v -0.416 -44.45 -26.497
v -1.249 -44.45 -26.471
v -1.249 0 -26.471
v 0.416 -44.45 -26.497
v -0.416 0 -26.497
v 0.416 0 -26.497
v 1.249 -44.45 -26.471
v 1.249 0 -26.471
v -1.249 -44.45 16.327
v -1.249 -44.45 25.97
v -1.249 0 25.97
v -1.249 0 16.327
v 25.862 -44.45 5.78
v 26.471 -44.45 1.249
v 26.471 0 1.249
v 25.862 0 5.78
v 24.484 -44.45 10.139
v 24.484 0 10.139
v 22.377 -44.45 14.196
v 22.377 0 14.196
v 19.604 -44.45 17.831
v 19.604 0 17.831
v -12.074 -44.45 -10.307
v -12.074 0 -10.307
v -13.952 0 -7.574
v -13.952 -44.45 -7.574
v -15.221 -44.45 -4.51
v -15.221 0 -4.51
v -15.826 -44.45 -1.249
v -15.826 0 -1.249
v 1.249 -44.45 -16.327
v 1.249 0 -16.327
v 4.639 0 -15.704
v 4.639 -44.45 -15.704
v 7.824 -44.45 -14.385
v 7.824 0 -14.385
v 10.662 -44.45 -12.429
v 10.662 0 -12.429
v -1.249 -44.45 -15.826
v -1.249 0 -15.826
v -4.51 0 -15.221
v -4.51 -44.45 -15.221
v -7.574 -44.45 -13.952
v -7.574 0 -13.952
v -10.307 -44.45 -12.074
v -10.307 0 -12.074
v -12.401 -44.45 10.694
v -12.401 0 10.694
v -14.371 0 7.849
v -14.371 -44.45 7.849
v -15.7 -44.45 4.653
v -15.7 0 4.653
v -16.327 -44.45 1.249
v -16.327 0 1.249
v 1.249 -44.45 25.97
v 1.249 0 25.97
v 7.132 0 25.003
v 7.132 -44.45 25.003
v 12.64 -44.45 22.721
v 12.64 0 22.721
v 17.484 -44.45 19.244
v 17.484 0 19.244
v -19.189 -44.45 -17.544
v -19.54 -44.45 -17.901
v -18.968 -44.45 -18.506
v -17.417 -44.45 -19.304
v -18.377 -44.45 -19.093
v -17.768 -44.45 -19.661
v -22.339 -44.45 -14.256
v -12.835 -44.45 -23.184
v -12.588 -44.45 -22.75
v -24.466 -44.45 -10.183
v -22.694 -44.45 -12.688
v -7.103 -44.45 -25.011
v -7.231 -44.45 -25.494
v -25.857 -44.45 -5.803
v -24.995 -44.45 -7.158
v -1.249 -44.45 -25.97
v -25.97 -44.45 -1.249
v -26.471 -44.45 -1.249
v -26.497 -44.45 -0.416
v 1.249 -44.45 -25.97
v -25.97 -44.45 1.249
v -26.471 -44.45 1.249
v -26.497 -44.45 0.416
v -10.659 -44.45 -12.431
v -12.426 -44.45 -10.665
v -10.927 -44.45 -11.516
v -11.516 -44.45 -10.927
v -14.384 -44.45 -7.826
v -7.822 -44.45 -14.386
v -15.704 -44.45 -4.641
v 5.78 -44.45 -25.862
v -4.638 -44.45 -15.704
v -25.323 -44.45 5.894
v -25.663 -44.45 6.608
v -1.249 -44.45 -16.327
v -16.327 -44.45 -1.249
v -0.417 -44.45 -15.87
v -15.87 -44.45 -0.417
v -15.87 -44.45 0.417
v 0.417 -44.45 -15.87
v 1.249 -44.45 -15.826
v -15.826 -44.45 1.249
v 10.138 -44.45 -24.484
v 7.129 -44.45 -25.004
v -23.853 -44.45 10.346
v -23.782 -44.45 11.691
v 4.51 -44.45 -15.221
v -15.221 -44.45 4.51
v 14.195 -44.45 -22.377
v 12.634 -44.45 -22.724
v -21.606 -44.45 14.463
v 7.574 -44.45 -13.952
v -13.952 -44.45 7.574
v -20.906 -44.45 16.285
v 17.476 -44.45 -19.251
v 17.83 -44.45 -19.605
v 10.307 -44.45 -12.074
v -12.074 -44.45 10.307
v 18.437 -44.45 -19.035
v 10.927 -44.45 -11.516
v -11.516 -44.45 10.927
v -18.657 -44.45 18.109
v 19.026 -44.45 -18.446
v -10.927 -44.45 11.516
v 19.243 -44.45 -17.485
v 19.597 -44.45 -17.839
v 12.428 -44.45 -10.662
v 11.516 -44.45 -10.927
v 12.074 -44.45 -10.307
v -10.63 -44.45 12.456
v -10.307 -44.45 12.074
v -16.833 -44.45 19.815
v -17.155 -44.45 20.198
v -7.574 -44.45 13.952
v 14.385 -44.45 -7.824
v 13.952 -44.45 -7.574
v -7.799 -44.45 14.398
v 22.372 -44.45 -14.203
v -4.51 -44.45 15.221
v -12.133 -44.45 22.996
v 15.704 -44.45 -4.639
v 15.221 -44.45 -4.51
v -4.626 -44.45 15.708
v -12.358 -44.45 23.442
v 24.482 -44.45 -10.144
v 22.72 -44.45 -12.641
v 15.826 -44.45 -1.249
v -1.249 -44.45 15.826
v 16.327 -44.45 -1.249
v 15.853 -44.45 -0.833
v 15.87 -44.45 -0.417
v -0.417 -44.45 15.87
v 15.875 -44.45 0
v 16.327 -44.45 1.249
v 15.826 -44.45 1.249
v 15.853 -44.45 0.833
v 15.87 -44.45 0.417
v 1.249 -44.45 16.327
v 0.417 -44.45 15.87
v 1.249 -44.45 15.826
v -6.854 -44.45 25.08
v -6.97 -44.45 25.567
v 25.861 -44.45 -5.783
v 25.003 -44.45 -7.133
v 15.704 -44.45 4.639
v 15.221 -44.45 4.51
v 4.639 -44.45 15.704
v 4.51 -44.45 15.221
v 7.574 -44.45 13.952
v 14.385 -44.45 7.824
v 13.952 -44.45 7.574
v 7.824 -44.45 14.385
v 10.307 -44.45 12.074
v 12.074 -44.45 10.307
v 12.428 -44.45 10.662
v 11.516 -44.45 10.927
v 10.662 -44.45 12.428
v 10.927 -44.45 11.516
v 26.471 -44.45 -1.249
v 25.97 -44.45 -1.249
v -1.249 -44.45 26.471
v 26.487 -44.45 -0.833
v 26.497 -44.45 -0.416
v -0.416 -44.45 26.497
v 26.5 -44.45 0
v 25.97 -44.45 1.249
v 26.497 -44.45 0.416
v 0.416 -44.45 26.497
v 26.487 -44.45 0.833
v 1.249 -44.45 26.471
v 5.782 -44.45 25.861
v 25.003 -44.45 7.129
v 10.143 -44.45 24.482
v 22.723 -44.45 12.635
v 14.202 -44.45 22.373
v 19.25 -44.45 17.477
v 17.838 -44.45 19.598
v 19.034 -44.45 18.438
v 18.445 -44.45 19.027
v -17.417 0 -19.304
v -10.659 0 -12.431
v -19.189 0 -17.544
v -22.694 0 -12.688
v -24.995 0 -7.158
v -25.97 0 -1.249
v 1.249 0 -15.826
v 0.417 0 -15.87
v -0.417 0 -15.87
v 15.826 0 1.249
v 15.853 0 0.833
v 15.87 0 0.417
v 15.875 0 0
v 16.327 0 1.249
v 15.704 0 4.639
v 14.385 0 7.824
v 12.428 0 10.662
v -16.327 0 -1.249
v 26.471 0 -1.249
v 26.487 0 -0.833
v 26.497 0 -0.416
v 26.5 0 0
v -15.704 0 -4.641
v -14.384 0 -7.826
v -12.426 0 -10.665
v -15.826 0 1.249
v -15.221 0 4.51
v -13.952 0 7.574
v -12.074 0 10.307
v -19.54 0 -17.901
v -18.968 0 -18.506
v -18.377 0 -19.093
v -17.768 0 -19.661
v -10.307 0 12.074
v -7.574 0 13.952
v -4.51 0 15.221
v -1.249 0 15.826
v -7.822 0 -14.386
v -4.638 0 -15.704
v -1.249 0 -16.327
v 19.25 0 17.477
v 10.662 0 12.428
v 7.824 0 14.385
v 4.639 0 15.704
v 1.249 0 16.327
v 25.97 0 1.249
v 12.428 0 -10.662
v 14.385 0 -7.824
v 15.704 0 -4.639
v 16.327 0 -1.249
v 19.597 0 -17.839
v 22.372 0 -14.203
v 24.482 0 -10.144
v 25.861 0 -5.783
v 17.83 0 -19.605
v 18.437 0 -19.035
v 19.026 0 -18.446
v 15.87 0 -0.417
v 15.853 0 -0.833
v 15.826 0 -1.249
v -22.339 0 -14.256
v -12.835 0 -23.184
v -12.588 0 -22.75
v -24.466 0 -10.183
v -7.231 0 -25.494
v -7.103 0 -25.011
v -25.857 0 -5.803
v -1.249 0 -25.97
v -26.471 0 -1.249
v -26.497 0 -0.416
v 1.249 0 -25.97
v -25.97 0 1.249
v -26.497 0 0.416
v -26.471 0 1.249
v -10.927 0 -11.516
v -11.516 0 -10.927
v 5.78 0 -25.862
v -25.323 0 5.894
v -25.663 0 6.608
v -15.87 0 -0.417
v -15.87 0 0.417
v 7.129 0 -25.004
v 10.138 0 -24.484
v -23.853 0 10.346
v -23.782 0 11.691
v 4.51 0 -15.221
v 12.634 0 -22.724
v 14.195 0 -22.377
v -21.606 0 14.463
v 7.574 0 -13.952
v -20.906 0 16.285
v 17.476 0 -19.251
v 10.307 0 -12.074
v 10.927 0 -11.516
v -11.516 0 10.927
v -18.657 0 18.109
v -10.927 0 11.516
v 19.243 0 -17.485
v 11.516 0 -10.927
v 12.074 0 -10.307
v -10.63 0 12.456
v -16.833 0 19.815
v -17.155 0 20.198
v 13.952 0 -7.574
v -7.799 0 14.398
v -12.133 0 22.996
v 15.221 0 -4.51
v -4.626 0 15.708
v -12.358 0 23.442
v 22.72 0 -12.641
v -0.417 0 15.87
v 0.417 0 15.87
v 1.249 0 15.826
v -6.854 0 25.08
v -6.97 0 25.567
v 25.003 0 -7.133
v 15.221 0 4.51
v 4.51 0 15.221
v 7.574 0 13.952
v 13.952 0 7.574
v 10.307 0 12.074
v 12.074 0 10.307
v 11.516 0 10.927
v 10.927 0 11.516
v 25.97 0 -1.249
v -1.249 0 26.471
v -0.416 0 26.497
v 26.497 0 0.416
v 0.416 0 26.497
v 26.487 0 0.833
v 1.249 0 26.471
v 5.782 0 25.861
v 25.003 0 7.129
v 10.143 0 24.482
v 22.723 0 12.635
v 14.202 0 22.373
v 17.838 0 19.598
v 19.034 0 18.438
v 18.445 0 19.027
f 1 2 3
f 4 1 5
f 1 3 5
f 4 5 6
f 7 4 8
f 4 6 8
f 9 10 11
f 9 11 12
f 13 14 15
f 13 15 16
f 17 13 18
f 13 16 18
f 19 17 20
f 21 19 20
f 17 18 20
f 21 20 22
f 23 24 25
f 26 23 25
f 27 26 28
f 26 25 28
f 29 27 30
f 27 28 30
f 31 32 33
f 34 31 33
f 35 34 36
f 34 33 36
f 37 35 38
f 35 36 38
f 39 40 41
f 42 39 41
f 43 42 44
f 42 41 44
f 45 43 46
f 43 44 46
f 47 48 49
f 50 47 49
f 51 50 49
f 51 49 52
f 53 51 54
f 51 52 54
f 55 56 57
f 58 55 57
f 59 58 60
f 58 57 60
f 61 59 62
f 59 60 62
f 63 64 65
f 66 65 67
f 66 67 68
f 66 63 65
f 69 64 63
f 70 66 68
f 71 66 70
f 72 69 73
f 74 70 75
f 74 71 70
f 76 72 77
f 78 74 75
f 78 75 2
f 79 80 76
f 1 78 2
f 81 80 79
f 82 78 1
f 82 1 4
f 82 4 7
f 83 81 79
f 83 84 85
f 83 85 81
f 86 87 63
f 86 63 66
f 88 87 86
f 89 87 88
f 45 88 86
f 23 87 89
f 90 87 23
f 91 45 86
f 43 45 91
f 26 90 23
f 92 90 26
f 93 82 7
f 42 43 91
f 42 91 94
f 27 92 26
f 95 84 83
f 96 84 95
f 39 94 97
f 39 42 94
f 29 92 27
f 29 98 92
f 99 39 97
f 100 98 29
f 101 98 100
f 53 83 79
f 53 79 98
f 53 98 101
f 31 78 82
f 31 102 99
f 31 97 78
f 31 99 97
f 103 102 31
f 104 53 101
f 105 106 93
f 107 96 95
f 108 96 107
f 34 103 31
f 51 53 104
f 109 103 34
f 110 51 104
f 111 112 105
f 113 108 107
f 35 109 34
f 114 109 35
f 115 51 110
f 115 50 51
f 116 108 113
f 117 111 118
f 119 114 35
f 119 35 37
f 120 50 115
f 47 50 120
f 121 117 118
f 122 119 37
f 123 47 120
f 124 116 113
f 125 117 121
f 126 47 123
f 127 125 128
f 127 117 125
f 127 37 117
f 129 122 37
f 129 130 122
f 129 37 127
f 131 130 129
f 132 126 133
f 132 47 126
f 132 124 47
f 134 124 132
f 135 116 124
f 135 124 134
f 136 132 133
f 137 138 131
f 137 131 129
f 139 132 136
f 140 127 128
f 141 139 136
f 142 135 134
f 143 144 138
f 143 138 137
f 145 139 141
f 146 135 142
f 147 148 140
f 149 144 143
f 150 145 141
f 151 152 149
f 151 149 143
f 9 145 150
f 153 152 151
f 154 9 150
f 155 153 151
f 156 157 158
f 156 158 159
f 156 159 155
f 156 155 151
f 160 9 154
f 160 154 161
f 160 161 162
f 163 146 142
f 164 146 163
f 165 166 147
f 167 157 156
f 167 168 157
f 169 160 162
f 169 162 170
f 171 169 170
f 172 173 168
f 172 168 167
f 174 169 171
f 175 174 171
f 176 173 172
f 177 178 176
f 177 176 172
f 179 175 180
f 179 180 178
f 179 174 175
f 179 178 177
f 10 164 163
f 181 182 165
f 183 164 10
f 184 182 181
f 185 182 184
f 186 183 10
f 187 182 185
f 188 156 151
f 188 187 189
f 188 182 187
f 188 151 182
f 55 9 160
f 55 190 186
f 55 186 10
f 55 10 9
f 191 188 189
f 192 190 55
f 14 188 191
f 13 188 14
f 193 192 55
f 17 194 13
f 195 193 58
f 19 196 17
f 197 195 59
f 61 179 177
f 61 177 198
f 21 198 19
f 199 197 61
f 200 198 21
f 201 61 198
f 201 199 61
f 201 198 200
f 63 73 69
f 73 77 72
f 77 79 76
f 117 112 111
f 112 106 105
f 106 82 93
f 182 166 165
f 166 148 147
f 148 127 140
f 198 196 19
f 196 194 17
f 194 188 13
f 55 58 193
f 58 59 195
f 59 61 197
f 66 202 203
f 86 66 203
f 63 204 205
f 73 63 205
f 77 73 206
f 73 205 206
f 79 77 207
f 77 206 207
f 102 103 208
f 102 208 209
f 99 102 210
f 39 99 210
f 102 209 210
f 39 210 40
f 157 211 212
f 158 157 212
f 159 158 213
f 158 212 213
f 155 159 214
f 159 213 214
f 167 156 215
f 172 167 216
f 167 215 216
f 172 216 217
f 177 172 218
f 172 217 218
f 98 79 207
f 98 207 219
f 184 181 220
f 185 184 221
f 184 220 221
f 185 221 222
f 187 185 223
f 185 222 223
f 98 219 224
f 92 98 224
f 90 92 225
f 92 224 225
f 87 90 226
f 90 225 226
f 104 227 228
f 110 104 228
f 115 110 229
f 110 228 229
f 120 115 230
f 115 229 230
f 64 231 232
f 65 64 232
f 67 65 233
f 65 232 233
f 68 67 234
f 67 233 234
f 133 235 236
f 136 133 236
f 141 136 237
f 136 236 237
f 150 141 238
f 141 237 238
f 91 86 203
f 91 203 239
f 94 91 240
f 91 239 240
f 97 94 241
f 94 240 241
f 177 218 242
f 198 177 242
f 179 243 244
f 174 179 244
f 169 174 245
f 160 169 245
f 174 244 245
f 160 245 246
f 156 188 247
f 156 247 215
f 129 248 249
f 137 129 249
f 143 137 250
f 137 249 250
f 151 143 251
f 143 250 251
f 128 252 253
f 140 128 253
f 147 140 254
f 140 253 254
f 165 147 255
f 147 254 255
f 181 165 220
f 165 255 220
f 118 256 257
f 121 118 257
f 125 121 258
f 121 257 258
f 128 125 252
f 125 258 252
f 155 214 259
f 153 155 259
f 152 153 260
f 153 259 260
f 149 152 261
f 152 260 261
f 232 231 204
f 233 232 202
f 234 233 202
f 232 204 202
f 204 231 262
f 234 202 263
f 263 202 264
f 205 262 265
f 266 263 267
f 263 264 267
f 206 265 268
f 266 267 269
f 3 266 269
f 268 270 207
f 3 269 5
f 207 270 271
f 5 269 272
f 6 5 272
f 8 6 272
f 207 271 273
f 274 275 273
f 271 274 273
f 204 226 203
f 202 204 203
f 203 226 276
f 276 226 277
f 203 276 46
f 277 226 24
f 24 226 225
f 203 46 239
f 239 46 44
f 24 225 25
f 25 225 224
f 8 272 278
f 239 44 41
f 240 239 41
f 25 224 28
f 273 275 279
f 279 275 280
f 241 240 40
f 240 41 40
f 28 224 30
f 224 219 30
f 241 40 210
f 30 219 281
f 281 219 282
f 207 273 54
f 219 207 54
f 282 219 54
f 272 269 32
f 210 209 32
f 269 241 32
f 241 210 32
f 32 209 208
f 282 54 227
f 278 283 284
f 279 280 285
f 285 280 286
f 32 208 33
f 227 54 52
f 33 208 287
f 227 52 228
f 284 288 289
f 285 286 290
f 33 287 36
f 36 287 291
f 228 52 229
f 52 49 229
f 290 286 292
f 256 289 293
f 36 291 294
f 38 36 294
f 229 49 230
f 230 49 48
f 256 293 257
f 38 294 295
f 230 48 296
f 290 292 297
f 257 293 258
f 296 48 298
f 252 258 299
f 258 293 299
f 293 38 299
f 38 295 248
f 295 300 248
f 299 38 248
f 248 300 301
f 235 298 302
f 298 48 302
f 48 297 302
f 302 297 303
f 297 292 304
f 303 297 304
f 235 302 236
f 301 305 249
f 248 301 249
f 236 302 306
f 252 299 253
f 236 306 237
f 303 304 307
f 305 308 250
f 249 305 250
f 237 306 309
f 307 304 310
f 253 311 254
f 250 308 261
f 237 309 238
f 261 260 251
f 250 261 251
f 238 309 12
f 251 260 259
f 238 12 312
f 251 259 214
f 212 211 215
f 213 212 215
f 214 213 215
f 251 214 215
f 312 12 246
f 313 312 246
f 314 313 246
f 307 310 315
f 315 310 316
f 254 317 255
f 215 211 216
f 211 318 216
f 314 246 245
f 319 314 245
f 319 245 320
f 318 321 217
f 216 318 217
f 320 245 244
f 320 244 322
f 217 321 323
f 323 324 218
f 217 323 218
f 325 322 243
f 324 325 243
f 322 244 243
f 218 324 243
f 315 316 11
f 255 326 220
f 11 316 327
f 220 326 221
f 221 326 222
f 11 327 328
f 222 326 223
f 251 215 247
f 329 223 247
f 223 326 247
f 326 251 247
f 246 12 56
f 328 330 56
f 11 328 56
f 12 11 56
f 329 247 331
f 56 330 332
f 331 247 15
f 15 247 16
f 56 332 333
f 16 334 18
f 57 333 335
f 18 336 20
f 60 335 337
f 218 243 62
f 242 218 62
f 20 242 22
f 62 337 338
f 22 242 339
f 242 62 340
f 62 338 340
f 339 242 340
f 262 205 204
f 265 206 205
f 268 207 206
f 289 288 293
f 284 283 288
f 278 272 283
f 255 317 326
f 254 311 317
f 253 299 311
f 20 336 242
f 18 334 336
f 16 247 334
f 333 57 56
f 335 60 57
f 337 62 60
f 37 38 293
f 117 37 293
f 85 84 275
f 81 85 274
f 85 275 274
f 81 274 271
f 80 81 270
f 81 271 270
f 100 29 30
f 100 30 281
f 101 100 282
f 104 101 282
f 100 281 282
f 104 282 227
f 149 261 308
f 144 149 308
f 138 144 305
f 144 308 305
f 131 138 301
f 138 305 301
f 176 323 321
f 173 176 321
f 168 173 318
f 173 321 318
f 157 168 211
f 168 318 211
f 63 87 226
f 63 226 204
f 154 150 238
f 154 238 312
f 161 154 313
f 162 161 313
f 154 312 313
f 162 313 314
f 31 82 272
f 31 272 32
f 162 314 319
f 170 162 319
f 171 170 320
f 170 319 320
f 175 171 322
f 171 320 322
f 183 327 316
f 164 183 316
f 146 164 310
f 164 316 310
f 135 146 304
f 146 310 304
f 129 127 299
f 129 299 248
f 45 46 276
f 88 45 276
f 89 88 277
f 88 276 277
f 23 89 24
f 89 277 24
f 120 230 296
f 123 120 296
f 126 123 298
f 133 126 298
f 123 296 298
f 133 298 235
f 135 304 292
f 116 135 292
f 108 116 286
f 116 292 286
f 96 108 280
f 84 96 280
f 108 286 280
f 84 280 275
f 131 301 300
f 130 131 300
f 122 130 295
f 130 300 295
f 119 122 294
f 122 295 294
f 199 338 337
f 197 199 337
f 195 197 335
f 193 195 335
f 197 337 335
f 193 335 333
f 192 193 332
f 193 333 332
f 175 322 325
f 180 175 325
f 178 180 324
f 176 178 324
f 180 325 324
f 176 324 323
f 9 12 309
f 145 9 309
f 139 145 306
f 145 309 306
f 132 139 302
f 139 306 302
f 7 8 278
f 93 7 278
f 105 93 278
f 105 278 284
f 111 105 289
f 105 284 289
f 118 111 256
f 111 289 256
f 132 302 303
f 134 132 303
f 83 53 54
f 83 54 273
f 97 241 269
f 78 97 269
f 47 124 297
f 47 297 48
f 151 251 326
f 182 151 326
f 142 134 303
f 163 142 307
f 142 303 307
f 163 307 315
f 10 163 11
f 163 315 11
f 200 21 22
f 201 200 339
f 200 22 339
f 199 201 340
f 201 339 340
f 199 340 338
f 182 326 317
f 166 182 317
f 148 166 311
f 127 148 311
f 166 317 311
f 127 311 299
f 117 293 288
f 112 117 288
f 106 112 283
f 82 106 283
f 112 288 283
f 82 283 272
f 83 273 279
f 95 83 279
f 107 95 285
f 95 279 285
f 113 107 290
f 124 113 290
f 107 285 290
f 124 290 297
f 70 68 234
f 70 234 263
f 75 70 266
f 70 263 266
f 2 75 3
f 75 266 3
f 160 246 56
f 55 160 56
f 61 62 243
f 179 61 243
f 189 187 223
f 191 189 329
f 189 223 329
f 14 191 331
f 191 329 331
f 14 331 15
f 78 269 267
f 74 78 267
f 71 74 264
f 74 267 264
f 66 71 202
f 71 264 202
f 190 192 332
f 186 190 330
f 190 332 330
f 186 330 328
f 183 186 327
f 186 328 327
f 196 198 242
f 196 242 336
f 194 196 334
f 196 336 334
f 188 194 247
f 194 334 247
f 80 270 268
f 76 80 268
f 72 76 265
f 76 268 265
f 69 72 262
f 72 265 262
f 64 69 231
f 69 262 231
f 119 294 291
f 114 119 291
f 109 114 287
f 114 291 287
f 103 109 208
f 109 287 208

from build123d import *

# Parameters (mm, degrees)
F1_DEPTH = 44.45


with BuildPart() as f1:
    # F0 (on Front) → F1 (new body)
    with BuildSketch(Plane.XZ):
        with BuildLine():
            Line((-1.2490308724, 15.8257874016), (-1.2490308724, 16.3272945364))
            ThreePointArc((-1.2490308724, 16.3272945364), (-6.2468599625, 15.1366233226), (-10.6297427896, 12.455889901))
            Line((-10.6297427896, 12.455889901), (-10.3074871892, 12.0735799515))
            ThreePointArc((-10.3074871892, 12.0735799515), (-6.0751989773, 14.6665463687), (-1.2490308724, 15.8257874016))
        make_face()
        with BuildLine():
            Line((1.2490308724, 15.8257874016), (1.2490308724, 16.3272945364))
            ThreePointArc((1.2490308724, 16.3272945364), (0, 16.375), (-1.2490308724, 16.3272945364))
            Line((-1.2490308724, 16.3272945364), (-1.2490308724, 15.8257874016))
            ThreePointArc((-1.2490308724, 15.8257874016), (0, 15.875), (1.2490308724, 15.8257874016))
        make_face()
        with BuildLine():
            Line((-10.3074871892, 12.0735799515), (-10.6297427896, 12.455889901))
            ThreePointArc((-10.6297427896, 12.455889901), (-11.5487712868, 11.6088977411), (-12.4005243169, 10.6942798573))
            Line((-12.4005243169, 10.6942798573), (-12.0738596244, 10.3071595879))
            ThreePointArc((-12.0738596244, 10.3071595879), (-11.2254724409, 11.2251678597), (-10.3074871892, 12.0735799515))
        make_face()
        with BuildLine():
            Line((-12.0738596244, 10.3071595879), (-12.4005243169, 10.6942798573))
            ThreePointArc((-12.4005243169, 10.6942798573), (-15.120353042, 6.2861394262), (-16.3272945364, 1.2490308724))
            Line((-16.3272945364, 1.2490308724), (-15.8257874016, 1.2490308724))
            ThreePointArc((-15.8257874016, 1.2490308724), (-14.6666287878, 6.075), (-12.0738596244, 10.3071595879))
        make_face()
        with BuildLine():
            Line((-15.8257874016, 1.2490308724), (-16.3272945364, 1.2490308724))
            ThreePointArc((-16.3272945364, 1.2490308724), (-16.375, 0), (-16.3272945364, -1.2490308724))
            Line((-16.3272945364, -1.2490308724), (-15.8257874016, -1.2490308724))
            ThreePointArc((-15.8257874016, -1.2490308724), (-15.875, 0), (-15.8257874016, 1.2490308724))
        make_face()
        with BuildLine():
            ThreePointArc((-16.3272945364, -1.2490308724), (-15.1277540364, -6.2683078112), (-12.42570743, -10.6650091357))
            Line((-12.42570743, -10.6650091357), (-12.0738596244, -10.3071595879))
            ThreePointArc((-12.0738596244, -10.3071595879), (-14.6666287878, -6.075), (-15.8257874016, -1.2490308724))
            Line((-15.8257874016, -1.2490308724), (-16.3272945364, -1.2490308724))
        make_face()
        with BuildLine():
            Line((10.3071595879, 12.0738596244), (10.6619551336, 12.4283280343))
            ThreePointArc((10.6619551336, 12.4283280343), (6.2664489031, 15.1285241562), (1.2490308724, 16.3272945364))
            Line((1.2490308724, 16.3272945364), (1.2490308724, 15.8257874016))
            ThreePointArc((1.2490308724, 15.8257874016), (6.075, 14.6666287878), (10.3071595879, 12.0738596244))
        make_face()
        with BuildLine():
            Line((12.0735799515, 10.3074871892), (12.4283478304, 10.6619320579))
            ThreePointArc((12.4283478304, 10.6619320579), (11.5788842912, 11.5788627927), (10.6619551336, 12.4283280343))
            Line((10.6619551336, 12.4283280343), (10.3071595879, 12.0738596244))
            ThreePointArc((10.3071595879, 12.0738596244), (11.2251678597, 11.2254724409), (12.0735799515, 10.3074871892))
        make_face()
        with BuildLine():
            Line((15.8257874016, 1.2490308724), (16.3272945364, 1.2490308724))
            ThreePointArc((16.3272945364, 1.2490308724), (15.1285299737, 6.2664348585), (12.4283478304, 10.6619320579))
            Line((12.4283478304, 10.6619320579), (12.0735799515, 10.3074871892))
            ThreePointArc((12.0735799515, 10.3074871892), (14.6665463687, 6.0751989773), (15.8257874016, 1.2490308724))
        make_face()
        with BuildLine():
            ThreePointArc((16.375, 0), (16.3630692878, 0.6249707856), (16.3272945364, 1.2490308724))
            Line((16.3272945364, 1.2490308724), (15.8257874016, 1.2490308724))
            ThreePointArc((15.8257874016, 1.2490308724), (15.8626920792, 0.625), (15.875, 0))
            ThreePointArc((15.875, 0), (15.8626920792, -0.625), (15.8257874016, -1.2490308724))
            Line((15.8257874016, -1.2490308724), (16.3272945364, -1.2490308724))
            ThreePointArc((16.3272945364, -1.2490308724), (16.3630692878, -0.6249707856), (16.375, 0))
        make_face()
        with BuildLine():
            ThreePointArc((12.4280217247, -10.6623121793), (15.1284341411, -6.2666662141), (16.3272945364, -1.2490308724))
            Line((16.3272945364, -1.2490308724), (15.8257874016, -1.2490308724))
            ThreePointArc((15.8257874016, -1.2490308724), (14.6665463687, -6.0751989773), (12.0735799515, -10.3074871892))
            Line((12.0735799515, -10.3074871892), (12.4280217247, -10.6623121793))
        make_face()
        with BuildLine():
            ThreePointArc((10.6615750043, -12.4286541278), (11.5785301419, -11.5792169318), (12.4280217247, -10.6623121793))
            Line((12.4280217247, -10.6623121793), (12.0735799515, -10.3074871892))
            ThreePointArc((12.0735799515, -10.3074871892), (11.2251678597, -11.2254724409), (10.3071595879, -12.0738596244))
            Line((10.3071595879, -12.0738596244), (10.6615750043, -12.4286541278))
        make_face()
        with BuildLine():
            ThreePointArc((1.2490308724, -16.3272945364), (6.266217547, -15.1286199851), (10.6615750043, -12.4286541278))
            Line((10.6615750043, -12.4286541278), (10.3071595879, -12.0738596244))
            ThreePointArc((10.3071595879, -12.0738596244), (6.075, -14.6666287878), (1.2490308724, -15.8257874016))
            Line((1.2490308724, -15.8257874016), (1.2490308724, -16.3272945364))
        make_face()
        with BuildLine():
            ThreePointArc((-1.2490308724, -16.3272945364), (0, -16.375), (1.2490308724, -16.3272945364))
            Line((1.2490308724, -16.3272945364), (1.2490308724, -15.8257874016))
            ThreePointArc((1.2490308724, -15.8257874016), (0, -15.875), (-1.2490308724, -15.8257874016))
            Line((-1.2490308724, -15.8257874016), (-1.2490308724, -16.3272945364))
        make_face()
        with BuildLine():
            ThreePointArc((-10.6588794621, -12.4309659163), (-6.2645771056, -15.1292993456), (-1.2490308724, -16.3272945364))
            Line((-1.2490308724, -16.3272945364), (-1.2490308724, -15.8257874016))
            ThreePointArc((-1.2490308724, -15.8257874016), (-6.0751989773, -14.6665463687), (-10.3074871892, -12.0735799515))
            Line((-10.3074871892, -12.0735799515), (-10.6588794621, -12.4309659163))
        make_face()
        with BuildLine():
            ThreePointArc((-12.42570743, -10.6650091357), (-11.5760178314, -11.5817285483), (-10.6588794621, -12.4309659163))
            Line((-10.6588794621, -12.4309659163), (-10.3074871892, -12.0735799515))
            ThreePointArc((-10.3074871892, -12.0735799515), (-11.2254724409, -11.2251678597), (-12.0738596244, -10.3071595879))
            Line((-12.0738596244, -10.3071595879), (-12.42570743, -10.6650091357))
        make_face()
        with BuildLine():
            Line((-16.3272945364, 1.2490308724), (-25.9699811683, 1.2490308724))
            ThreePointArc((-25.9699811683, 1.2490308724), (-26, 0), (-25.9699811683, -1.2490308724))
            Line((-25.9699811683, -1.2490308724), (-16.3272945364, -1.2490308724))
            ThreePointArc((-16.3272945364, -1.2490308724), (-16.375, 0), (-16.3272945364, 1.2490308724))
        make_face()
        with BuildLine():
            Line((-10.6297427896, 12.455889901), (-16.8331168629, 19.8153015793))
            ThreePointArc((-16.8331168629, 19.8153015793), (-17.7655269326, 18.9838366198), (-18.6569206444, 18.1085425164))
            Line((-18.6569206444, 18.1085425164), (-12.4005243169, 10.6942798573))
            ThreePointArc((-12.4005243169, 10.6942798573), (-11.5487712868, 11.6088977411), (-10.6297427896, 12.455889901))
        make_face()
        with BuildLine():
            Line((1.2490308724, 16.3272945364), (1.2490308724, 25.9699811683))
            ThreePointArc((1.2490308724, 25.9699811683), (0, 26), (-1.2490308724, 25.9699811683))
            Line((-1.2490308724, 25.9699811683), (-1.2490308724, 16.3272945364))
            ThreePointArc((-1.2490308724, 16.3272945364), (0, 16.375), (1.2490308724, 16.3272945364))
        make_face()
        with BuildLine():
            Line((12.4283478304, 10.6619320579), (19.2497129633, 17.4770864514))
            ThreePointArc((19.2497129633, 17.4770864514), (18.3879155416, 18.381636544), (17.4836598335, 19.2437428487))
            Line((17.4836598335, 19.2437428487), (10.6619551336, 12.4283280343))
            ThreePointArc((10.6619551336, 12.4283280343), (11.5788842912, 11.5788627927), (12.4283478304, 10.6619320579))
        make_face()
        with BuildLine():
            ThreePointArc((26, 0), (25.9924942087, 0.624695776), (25.9699811683, 1.2490308724))
            Line((25.9699811683, 1.2490308724), (16.3272945364, 1.2490308724))
            ThreePointArc((16.3272945364, 1.2490308724), (16.3630692878, 0.6249707856), (16.375, 0))
            ThreePointArc((16.375, 0), (16.3630692878, -0.6249707856), (16.3272945364, -1.2490308724))
            Line((16.3272945364, -1.2490308724), (25.9699811683, -1.2490308724))
            ThreePointArc((25.9699811683, -1.2490308724), (25.9924942087, -0.624695776), (26, 0))
        make_face()
        with BuildLine():
            ThreePointArc((17.4761736065, -19.2505417087), (18.3807645643, -18.3887871822), (19.2429137476, -17.4845723568))
            Line((19.2429137476, -17.4845723568), (12.4280217247, -10.6623121793))
            ThreePointArc((12.4280217247, -10.6623121793), (11.5785301419, -11.5792169318), (10.6615750043, -12.4286541278))
            Line((10.6615750043, -12.4286541278), (17.4761736065, -19.2505417087))
        make_face()
        with BuildLine():
            ThreePointArc((-1.2490308724, -25.9699811683), (0, -26), (1.2490308724, -25.9699811683))
            Line((1.2490308724, -25.9699811683), (1.2490308724, -16.3272945364))
            ThreePointArc((1.2490308724, -16.3272945364), (0, -16.375), (-1.2490308724, -16.3272945364))
            Line((-1.2490308724, -16.3272945364), (-1.2490308724, -25.9699811683))
        make_face()
        with BuildLine():
            ThreePointArc((-19.189026681, -17.5436955923), (-18.3241000354, -18.4452529907), (-17.4168625049, -19.3042197585))
            Line((-17.4168625049, -19.3042197585), (-10.6588794621, -12.4309659163))
            ThreePointArc((-10.6588794621, -12.4309659163), (-11.5760178314, -11.5817285483), (-12.42570743, -10.6650091357))
            Line((-12.42570743, -10.6650091357), (-19.189026681, -17.5436955923))
        make_face()
        with BuildLine():
            ThreePointArc((-26.4705481976, -1.2490308724), (-24.4655644109, -10.1826400337), (-19.540065228, -17.9007220772))
            Line((-19.540065228, -17.9007220772), (-19.189026681, -17.5436955923))
            ThreePointArc((-19.189026681, -17.5436955923), (-24.0044375495, -9.9893432183), (-25.9699811683, -1.2490308724))
            Line((-25.9699811683, -1.2490308724), (-26.4705481976, -1.2490308724))
        make_face()
        with BuildLine():
            Line((-25.9699811683, 1.2490308724), (-26.4705481976, 1.2490308724))
            ThreePointArc((-26.4705481976, 1.2490308724), (-26.5, 0), (-26.4705481976, -1.2490308724))
            Line((-26.4705481976, -1.2490308724), (-25.9699811683, -1.2490308724))
            ThreePointArc((-25.9699811683, -1.2490308724), (-26, 0), (-25.9699811683, 1.2490308724))
        make_face()
        with BuildLine():
            Line((-18.6569206444, 18.1085425164), (-18.9809440271, 18.4925326508))
            ThreePointArc((-18.9809440271, 18.4925326508), (-24.3062569055, 10.5572664664), (-26.4705481976, 1.2490308724))
            Line((-26.4705481976, 1.2490308724), (-25.9699811683, 1.2490308724))
            ThreePointArc((-25.9699811683, 1.2490308724), (-23.8526911389, 10.3464547276), (-18.6569206444, 18.1085425164))
        make_face()
        with BuildLine():
            Line((-16.8331168629, 19.8153015793), (-17.1553686227, 20.1976069726))
            ThreePointArc((-17.1553686227, 20.1976069726), (-18.0882584179, 19.3665925606), (-18.9809440271, 18.4925326508))
            Line((-18.9809440271, 18.4925326508), (-18.6569206444, 18.1085425164))
            ThreePointArc((-18.6569206444, 18.1085425164), (-17.7655269326, 18.9838366198), (-16.8331168629, 19.8153015793))
        make_face()
        with BuildLine():
            Line((-1.2490308724, 25.9699811683), (-1.2490308724, 26.4705481976))
            ThreePointArc((-1.2490308724, 26.4705481976), (-9.7220331257, 24.6522224536), (-17.1553686227, 20.1976069726))
            Line((-17.1553686227, 20.1976069726), (-16.8331168629, 19.8153015793))
            ThreePointArc((-16.8331168629, 19.8153015793), (-9.5504469472, 24.1824102006), (-1.2490308724, 25.9699811683))
        make_face()
        with BuildLine():
            Line((1.2490308724, 25.9699811683), (1.2490308724, 26.4705481976))
            ThreePointArc((1.2490308724, 26.4705481976), (0, 26.5), (-1.2490308724, 26.4705481976))
            Line((-1.2490308724, 26.4705481976), (-1.2490308724, 25.9699811683))
            ThreePointArc((-1.2490308724, 25.9699811683), (0, 26), (1.2490308724, 25.9699811683))
        make_face()
        with BuildLine():
            Line((17.4836598335, 19.2437428487), (17.8377822412, 19.5975387413))
            ThreePointArc((17.8377822412, 19.5975387413), (10.1432821835, 24.4819081476), (1.2490308724, 26.4705481976))
            Line((1.2490308724, 26.4705481976), (1.2490308724, 25.9699811683))
            ThreePointArc((1.2490308724, 25.9699811683), (9.9518337885, 24.020012578), (17.4836598335, 19.2437428487))
        make_face()
        with BuildLine():
            Line((19.2497129633, 17.4770864514), (19.6038237141, 17.8308747903))
            ThreePointArc((19.6038237141, 17.8308747903), (18.7416311858, 18.7350276353), (17.8377822412, 19.5975387413))
            Line((17.8377822412, 19.5975387413), (17.4836598335, 19.2437428487))
            ThreePointArc((17.4836598335, 19.2437428487), (18.3879155416, 18.381636544), (19.2497129633, 17.4770864514))
        make_face()
        with BuildLine():
            Line((25.9699811683, 1.2490308724), (26.4705481976, 1.2490308724))
            ThreePointArc((26.4705481976, 1.2490308724), (24.483695058, 10.1389682072), (19.6038237141, 17.8308747903))
            Line((19.6038237141, 17.8308747903), (19.2497129633, 17.4770864514))
            ThreePointArc((19.2497129633, 17.4770864514), (24.0217116648, 9.9477318366), (25.9699811683, 1.2490308724))
        make_face()
        with BuildLine():
            ThreePointArc((26.4705481976, -1.2490308724), (26.4926360262, -0.6246890284), (26.5, 0))
            ThreePointArc((26.5, 0), (26.4926360262, 0.6246890284), (26.4705481976, 1.2490308724))
            Line((26.4705481976, 1.2490308724), (25.9699811683, 1.2490308724))
            ThreePointArc((25.9699811683, 1.2490308724), (25.9924942087, 0.624695776), (26, 0))
            ThreePointArc((26, 0), (25.9924942087, -0.624695776), (25.9699811683, -1.2490308724))
            Line((25.9699811683, -1.2490308724), (26.4705481976, -1.2490308724))
        make_face()
        with BuildLine():
            ThreePointArc((19.5966821713, -17.8387232693), (24.4816646068, -10.1438699755), (26.4705481976, -1.2490308724))
            Line((26.4705481976, -1.2490308724), (25.9699811683, -1.2490308724))
            ThreePointArc((25.9699811683, -1.2490308724), (24.019776612, -9.9524033031), (19.2429137476, -17.4845723568))
            Line((19.2429137476, -17.4845723568), (19.5966821713, -17.8387232693))
        make_face()
        with BuildLine():
            ThreePointArc((17.8299334192, -19.6046799073), (18.7341276645, -18.7425307963), (19.5966821713, -17.8387232693))
            Line((19.5966821713, -17.8387232693), (19.2429137476, -17.4845723568))
            ThreePointArc((19.2429137476, -17.4845723568), (18.3807645643, -18.3887871822), (17.4761736065, -19.2505417087))
            Line((17.4761736065, -19.2505417087), (17.8299334192, -19.6046799073))
        make_face()
        with BuildLine():
            ThreePointArc((1.2490308724, -26.4705481976), (10.1383803665, -24.4839384811), (17.8299334192, -19.6046799073))
            Line((17.8299334192, -19.6046799073), (17.4761736065, -19.2505417087))
            ThreePointArc((17.4761736065, -19.2505417087), (9.9471622766, -24.0219475198), (1.2490308724, -25.9699811683))
            Line((1.2490308724, -25.9699811683), (1.2490308724, -26.4705481976))
        make_face()
        with BuildLine():
            ThreePointArc((-1.2490308724, -26.4705481976), (0, -26.5), (1.2490308724, -26.4705481976))
            Line((1.2490308724, -26.4705481976), (1.2490308724, -25.9699811683))
            ThreePointArc((1.2490308724, -25.9699811683), (0, -26), (-1.2490308724, -25.9699811683))
            Line((-1.2490308724, -25.9699811683), (-1.2490308724, -26.4705481976))
        make_face()
        with BuildLine():
            ThreePointArc((-17.7677302473, -19.6610722459), (-10.0995812564, -24.4999685397), (-1.2490308724, -26.4705481976))
            Line((-1.2490308724, -26.4705481976), (-1.2490308724, -25.9699811683))
            ThreePointArc((-1.2490308724, -25.9699811683), (-9.9101961477, -24.0372213934), (-17.4168625049, -19.3042197585))
            Line((-17.4168625049, -19.3042197585), (-17.7677302473, -19.6610722459))
        make_face()
        with BuildLine():
            ThreePointArc((-19.540065228, -17.9007220772), (-18.6746515091, -18.8017922288), (-17.7677302473, -19.6610722459))
            Line((-17.7677302473, -19.6610722459), (-17.4168625049, -19.3042197585))
            ThreePointArc((-17.4168625049, -19.3042197585), (-18.3241000354, -18.4452529907), (-19.189026681, -17.5436955923))
            Line((-19.189026681, -17.5436955923), (-19.540065228, -17.9007220772))
        make_face()
    extrude(amount=F1_DEPTH)


solid = f1.part
